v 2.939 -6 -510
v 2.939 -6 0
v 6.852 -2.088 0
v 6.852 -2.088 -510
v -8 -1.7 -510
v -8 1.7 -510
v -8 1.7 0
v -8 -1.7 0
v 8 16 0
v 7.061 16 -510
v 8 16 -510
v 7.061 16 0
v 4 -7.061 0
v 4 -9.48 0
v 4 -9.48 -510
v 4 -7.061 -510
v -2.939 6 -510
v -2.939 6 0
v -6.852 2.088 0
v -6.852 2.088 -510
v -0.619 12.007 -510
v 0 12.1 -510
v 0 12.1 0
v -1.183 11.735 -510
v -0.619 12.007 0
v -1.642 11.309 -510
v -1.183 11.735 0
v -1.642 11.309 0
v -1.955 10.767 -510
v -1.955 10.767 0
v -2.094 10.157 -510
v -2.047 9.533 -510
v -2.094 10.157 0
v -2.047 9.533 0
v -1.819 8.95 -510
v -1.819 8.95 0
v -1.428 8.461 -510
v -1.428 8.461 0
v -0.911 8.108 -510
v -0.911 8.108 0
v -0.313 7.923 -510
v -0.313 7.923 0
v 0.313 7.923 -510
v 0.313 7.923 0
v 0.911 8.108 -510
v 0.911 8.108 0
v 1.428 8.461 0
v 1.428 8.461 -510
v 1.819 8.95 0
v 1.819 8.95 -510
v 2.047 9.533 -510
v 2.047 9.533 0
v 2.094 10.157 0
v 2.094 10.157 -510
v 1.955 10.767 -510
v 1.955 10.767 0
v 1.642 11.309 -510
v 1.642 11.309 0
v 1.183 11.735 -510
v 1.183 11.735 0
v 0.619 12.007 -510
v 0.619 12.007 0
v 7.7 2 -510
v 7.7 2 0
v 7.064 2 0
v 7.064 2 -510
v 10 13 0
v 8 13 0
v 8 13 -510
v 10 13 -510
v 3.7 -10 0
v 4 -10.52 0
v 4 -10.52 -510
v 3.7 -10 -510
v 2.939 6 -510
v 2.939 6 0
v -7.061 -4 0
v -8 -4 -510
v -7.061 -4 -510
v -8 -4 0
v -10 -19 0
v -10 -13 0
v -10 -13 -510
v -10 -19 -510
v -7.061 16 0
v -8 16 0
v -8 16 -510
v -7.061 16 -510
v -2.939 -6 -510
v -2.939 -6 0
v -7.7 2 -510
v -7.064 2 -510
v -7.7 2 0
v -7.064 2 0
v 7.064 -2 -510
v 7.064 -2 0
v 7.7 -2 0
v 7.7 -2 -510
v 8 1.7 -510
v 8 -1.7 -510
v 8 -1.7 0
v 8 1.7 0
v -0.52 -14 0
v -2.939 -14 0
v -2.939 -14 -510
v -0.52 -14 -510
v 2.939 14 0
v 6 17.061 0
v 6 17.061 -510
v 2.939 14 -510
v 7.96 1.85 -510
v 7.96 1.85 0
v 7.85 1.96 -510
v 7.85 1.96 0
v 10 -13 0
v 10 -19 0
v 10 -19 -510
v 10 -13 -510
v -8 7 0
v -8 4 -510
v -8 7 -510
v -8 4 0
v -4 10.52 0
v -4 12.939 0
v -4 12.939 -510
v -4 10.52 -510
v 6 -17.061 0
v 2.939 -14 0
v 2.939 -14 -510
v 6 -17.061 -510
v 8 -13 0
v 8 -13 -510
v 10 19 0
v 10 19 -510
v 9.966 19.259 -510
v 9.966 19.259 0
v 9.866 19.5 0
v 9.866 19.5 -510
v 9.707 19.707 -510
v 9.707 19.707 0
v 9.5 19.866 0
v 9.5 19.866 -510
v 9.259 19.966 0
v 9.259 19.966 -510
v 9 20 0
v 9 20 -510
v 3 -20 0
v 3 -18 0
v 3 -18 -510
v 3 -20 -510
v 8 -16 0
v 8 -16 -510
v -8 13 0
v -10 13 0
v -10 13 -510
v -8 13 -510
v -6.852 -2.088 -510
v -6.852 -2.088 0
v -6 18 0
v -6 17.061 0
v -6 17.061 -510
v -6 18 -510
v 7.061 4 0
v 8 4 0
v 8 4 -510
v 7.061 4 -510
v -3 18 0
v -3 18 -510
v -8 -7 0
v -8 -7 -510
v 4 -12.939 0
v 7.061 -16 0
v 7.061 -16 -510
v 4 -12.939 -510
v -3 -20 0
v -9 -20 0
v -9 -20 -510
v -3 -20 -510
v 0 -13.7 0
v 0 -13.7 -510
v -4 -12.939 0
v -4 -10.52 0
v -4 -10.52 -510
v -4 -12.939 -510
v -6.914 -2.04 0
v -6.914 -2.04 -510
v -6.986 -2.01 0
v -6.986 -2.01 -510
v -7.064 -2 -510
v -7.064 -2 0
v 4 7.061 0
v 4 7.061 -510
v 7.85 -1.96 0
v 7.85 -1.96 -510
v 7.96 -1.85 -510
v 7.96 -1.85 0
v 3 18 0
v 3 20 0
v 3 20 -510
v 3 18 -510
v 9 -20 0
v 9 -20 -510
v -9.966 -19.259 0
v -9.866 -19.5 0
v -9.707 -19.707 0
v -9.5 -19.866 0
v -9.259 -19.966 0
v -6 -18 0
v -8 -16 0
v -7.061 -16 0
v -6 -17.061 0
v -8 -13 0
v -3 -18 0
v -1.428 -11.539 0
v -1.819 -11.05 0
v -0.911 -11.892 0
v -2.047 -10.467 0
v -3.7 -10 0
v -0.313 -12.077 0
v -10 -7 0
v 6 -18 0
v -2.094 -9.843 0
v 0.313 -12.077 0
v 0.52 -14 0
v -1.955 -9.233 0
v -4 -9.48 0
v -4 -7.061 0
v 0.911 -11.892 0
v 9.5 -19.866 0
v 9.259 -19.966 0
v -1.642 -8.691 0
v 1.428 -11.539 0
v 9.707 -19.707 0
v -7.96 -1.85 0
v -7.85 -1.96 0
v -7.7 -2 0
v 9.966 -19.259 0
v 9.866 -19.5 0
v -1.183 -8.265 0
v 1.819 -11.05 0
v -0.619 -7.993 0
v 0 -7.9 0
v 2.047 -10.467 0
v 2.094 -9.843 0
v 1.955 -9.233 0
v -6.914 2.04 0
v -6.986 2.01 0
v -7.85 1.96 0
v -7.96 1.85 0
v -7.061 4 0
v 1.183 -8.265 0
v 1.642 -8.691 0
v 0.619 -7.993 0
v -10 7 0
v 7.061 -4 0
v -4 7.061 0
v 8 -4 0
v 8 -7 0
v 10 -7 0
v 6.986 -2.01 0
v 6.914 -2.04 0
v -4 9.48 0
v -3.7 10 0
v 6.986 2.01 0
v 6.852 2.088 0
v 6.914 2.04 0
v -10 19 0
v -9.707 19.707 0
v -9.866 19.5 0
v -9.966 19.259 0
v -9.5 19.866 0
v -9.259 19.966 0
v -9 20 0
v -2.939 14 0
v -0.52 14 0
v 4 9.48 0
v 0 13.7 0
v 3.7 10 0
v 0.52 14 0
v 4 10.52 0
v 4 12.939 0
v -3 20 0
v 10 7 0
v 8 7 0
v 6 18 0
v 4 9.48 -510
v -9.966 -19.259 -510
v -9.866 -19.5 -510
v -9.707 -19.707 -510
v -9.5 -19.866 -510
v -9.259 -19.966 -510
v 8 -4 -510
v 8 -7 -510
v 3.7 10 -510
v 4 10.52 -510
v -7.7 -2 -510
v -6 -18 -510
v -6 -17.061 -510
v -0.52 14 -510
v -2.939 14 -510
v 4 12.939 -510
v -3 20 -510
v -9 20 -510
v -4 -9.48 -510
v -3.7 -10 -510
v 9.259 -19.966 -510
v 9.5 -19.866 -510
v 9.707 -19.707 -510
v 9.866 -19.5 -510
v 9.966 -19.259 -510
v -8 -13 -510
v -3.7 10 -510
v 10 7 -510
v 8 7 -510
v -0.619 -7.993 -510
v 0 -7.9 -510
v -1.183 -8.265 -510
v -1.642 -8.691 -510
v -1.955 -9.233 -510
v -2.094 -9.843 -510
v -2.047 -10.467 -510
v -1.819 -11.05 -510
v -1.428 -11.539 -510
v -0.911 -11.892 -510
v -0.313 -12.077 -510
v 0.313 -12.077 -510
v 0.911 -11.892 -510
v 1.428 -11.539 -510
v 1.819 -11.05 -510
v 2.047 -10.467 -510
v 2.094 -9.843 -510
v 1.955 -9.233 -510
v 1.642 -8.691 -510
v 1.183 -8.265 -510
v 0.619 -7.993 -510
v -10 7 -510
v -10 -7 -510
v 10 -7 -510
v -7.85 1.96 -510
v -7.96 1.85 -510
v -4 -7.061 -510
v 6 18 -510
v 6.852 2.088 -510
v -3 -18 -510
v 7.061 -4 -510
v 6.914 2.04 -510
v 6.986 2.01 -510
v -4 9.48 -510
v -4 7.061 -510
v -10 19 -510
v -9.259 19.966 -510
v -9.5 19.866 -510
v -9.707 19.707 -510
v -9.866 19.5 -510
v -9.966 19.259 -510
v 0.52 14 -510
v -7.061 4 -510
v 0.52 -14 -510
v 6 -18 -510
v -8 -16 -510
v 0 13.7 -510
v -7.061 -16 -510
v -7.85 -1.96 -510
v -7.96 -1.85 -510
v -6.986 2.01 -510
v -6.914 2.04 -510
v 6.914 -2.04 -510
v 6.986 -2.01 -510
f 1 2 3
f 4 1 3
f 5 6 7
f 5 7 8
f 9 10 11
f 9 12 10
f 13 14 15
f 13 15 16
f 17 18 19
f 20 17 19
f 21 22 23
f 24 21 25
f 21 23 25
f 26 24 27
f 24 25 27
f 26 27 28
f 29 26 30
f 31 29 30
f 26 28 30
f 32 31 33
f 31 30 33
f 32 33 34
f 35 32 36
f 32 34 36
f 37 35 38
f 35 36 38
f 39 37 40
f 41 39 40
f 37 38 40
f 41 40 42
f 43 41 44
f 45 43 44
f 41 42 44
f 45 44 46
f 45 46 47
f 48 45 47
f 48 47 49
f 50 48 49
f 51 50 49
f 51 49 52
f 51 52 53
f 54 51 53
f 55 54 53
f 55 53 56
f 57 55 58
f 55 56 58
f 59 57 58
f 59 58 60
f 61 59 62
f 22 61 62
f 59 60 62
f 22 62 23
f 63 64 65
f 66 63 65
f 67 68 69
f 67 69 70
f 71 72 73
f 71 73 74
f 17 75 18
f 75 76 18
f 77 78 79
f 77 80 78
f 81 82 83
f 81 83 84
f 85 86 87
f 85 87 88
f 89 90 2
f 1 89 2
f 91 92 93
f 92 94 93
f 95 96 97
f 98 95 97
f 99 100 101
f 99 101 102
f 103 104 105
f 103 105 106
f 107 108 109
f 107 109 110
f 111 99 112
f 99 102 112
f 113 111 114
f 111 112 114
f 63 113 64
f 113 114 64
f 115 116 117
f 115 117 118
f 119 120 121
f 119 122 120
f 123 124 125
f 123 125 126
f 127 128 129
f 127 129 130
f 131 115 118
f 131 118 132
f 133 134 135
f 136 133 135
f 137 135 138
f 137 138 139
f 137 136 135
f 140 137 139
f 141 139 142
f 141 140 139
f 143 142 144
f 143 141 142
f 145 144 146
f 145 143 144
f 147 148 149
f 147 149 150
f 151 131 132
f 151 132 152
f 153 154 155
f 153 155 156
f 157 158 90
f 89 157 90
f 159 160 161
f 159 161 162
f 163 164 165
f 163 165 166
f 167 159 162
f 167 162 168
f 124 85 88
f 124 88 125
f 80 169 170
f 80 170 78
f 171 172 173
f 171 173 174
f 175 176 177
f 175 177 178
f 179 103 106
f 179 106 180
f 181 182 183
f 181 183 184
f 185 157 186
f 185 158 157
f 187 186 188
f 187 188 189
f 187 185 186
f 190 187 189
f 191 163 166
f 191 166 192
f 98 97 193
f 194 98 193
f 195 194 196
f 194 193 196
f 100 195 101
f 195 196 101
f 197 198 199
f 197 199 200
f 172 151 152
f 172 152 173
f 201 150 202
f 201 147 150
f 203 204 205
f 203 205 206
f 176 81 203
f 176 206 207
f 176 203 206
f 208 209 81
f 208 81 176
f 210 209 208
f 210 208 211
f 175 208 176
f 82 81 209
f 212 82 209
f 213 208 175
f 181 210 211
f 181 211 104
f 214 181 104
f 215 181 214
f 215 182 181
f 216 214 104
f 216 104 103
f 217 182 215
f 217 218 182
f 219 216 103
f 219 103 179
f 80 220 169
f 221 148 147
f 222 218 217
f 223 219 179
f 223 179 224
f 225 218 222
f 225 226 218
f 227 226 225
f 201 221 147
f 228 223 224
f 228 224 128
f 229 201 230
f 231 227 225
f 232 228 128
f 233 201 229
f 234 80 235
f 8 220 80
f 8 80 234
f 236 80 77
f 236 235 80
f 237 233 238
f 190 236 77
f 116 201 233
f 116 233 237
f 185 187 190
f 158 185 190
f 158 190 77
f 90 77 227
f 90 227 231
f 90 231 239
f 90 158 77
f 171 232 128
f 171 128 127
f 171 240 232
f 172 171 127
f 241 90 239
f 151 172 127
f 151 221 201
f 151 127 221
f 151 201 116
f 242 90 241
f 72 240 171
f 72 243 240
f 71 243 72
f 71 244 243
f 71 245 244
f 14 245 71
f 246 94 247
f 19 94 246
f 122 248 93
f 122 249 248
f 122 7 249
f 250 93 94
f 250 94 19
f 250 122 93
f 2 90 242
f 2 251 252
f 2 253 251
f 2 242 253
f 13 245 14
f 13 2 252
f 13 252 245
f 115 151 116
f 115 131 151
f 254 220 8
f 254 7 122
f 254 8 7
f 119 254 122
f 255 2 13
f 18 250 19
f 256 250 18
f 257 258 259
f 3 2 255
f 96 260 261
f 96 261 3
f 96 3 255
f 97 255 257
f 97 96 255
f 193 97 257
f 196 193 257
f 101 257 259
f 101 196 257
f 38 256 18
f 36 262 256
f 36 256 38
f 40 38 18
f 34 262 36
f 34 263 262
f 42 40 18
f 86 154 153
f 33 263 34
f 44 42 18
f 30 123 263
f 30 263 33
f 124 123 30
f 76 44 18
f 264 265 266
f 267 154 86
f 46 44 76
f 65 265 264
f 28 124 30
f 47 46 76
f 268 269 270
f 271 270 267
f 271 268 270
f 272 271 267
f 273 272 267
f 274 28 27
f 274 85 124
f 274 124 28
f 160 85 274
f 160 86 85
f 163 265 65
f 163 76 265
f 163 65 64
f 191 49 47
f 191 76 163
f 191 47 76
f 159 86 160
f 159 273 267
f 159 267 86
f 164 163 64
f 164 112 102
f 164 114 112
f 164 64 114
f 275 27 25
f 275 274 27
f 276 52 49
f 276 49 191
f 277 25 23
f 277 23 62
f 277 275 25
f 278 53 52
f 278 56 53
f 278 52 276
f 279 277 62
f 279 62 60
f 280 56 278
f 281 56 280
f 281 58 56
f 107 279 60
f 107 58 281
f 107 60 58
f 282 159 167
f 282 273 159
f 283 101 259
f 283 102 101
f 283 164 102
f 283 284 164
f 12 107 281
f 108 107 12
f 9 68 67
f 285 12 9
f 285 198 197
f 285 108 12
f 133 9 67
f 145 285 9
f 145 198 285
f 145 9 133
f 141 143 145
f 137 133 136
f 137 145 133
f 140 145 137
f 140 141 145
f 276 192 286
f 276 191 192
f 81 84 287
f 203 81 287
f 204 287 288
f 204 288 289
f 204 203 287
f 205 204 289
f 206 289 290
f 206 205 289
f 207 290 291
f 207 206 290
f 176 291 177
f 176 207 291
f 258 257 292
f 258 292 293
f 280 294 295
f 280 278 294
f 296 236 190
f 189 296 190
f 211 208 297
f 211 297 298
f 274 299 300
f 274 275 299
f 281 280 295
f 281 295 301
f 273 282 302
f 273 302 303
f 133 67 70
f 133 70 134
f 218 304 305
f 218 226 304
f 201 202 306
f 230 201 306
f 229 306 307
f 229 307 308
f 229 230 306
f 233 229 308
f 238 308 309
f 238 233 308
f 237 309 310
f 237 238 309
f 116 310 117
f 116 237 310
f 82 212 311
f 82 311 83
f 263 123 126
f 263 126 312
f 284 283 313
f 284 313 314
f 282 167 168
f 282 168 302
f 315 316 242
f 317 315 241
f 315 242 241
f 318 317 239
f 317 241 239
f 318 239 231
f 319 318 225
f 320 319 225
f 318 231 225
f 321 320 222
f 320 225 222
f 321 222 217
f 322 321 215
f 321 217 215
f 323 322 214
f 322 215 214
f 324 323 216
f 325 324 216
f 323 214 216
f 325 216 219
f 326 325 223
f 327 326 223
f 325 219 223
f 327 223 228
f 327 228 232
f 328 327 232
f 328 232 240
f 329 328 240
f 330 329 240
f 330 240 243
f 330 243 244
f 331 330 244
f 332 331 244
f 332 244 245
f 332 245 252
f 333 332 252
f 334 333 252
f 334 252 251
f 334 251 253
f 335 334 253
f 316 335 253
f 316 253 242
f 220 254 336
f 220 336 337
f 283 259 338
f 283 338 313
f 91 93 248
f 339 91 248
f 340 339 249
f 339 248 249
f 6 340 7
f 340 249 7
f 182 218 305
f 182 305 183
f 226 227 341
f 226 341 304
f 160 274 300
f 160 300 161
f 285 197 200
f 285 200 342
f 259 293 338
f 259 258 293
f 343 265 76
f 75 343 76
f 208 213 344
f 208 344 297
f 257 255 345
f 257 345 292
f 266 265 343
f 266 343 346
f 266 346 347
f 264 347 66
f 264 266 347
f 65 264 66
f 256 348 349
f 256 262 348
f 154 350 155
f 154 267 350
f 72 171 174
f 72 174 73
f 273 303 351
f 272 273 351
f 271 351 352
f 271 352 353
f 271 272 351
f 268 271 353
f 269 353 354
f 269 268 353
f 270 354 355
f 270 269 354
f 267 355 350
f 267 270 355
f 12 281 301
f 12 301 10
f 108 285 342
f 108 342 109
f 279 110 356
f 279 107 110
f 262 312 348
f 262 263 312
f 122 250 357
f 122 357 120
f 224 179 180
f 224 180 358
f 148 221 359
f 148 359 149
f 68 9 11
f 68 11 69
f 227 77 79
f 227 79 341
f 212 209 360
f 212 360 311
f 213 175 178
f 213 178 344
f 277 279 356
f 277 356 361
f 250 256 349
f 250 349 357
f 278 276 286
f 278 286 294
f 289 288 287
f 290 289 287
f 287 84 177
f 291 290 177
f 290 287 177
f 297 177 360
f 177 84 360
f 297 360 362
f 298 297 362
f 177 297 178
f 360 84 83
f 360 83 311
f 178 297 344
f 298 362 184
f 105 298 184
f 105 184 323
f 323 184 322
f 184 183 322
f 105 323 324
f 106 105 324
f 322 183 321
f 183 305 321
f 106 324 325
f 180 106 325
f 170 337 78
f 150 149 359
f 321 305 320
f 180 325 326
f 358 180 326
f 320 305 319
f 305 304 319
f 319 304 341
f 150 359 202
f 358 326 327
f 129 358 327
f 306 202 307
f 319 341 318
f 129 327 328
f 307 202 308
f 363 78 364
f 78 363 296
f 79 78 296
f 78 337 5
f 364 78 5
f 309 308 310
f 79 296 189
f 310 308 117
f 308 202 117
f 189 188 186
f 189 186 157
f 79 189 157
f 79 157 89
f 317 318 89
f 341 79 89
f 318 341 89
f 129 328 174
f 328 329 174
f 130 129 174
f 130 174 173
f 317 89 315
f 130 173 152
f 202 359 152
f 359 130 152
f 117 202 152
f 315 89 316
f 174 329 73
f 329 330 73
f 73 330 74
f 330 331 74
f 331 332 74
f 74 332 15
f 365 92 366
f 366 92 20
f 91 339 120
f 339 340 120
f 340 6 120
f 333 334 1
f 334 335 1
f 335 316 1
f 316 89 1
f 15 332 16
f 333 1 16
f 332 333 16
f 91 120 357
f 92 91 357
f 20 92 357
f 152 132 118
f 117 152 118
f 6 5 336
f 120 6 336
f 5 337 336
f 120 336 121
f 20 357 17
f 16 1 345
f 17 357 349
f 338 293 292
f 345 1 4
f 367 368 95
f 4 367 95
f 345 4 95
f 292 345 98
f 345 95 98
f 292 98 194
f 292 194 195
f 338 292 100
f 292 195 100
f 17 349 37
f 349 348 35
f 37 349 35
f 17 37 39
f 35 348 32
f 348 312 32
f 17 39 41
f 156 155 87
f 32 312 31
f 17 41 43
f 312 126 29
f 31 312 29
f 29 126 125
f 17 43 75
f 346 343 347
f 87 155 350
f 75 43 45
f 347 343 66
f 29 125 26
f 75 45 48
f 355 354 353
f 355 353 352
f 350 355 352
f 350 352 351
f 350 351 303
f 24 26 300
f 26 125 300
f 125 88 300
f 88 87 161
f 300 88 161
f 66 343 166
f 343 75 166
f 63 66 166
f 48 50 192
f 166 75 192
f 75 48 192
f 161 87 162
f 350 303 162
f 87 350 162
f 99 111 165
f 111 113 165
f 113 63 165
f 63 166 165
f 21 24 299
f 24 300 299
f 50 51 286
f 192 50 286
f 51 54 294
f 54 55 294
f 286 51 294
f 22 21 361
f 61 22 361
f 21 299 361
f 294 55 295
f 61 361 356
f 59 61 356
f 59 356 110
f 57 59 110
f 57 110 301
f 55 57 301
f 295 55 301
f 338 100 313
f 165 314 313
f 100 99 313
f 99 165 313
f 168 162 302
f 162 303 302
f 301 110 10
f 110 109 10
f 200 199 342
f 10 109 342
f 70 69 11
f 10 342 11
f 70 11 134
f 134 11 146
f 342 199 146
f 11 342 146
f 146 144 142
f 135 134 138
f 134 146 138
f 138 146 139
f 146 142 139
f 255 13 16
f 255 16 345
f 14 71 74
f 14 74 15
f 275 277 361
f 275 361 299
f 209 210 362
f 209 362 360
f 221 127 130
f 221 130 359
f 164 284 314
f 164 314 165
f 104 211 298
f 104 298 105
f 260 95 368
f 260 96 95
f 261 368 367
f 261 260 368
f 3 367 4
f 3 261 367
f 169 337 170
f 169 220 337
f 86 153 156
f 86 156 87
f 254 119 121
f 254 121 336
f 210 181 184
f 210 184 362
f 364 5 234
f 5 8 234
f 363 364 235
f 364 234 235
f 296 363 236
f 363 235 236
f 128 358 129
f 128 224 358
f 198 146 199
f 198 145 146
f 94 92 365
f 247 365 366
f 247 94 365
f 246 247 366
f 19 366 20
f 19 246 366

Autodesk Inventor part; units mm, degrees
sketch "Sketch_1" plane through (0, 0, 0) normal (0, 0, 1) x (1, 0, 0)
  line L0 (-10, -7) -> (-8, -7)
  line L1 (-8, -7) -> (-8, -4)
  line L2 (-8, -4) -> (-7.0607, -4)
  line L3 (-7.0607, -4) -> (-4, -7.0607)
  line L4 (-4, -7.0607) -> (-4, -9.4804)
  line L5 (-4, -9.4804) -> (-3.7, -10)
  line L6 (-3.7, -10) -> (-4, -10.5196)
  line L7 (-4, -10.5196) -> (-4, -12.9393)
  line L8 (-4, -12.9393) -> (-7.0607, -16)
  line L9 (-7.0607, -16) -> (-8, -16)
  line L10 (-8, -16) -> (-8, -13)
  line L11 (-8, -13) -> (-10, -13)
  line L12 (-10, -13) -> (-10, -19)
  arc A0 (-10, -19) -> (-9, -20) centre (-9, -19) ccw
  line L13 (-9, -20) -> (-3, -20)
  line L14 (-3, -20) -> (-3, -18)
  line L15 (-3, -18) -> (-6, -18)
  line L16 (-6, -18) -> (-6, -17.0607)
  line L17 (-6, -17.0607) -> (-2.9393, -14)
  line L18 (-2.9393, -14) -> (-0.5196, -14)
  line L19 (-0.5196, -14) -> (0, -13.7)
  line L20 (0, -13.7) -> (0.5196, -14)
  line L21 (0.5196, -14) -> (2.9393, -14)
  line L22 (2.9393, -14) -> (6, -17.0607)
  line L23 (6, -17.0607) -> (6, -18)
  line L24 (6, -18) -> (3, -18)
  line L25 (3, -18) -> (3, -20)
  line L26 (3, -20) -> (9, -20)
  arc A1 (9, -20) -> (10, -19) centre (9, -19) ccw
  line L27 (10, -19) -> (10, -13)
  line L28 (10, -13) -> (8, -13)
  line L29 (8, -13) -> (8, -16)
  line L30 (8, -16) -> (7.0607, -16)
  line L31 (7.0607, -16) -> (4, -12.9393)
  line L32 (4, -12.9393) -> (4, -10.5196)
  line L33 (4, -10.5196) -> (3.7, -10)
  line L34 (3.7, -10) -> (4, -9.4804)
  line L35 (4, -9.4804) -> (4, -7.0607)
  line L36 (4, -7.0607) -> (7.0607, -4)
  line L37 (7.0607, -4) -> (8, -4)
  line L38 (8, -4) -> (8, -7)
  line L39 (8, -7) -> (10, -7)
  line L40 (10, -7) -> (10, 7)
  line L41 (10, 7) -> (8, 7)
  line L42 (8, 7) -> (8, 4)
  line L43 (8, 4) -> (7.0607, 4)
  line L44 (7.0607, 4) -> (4, 7.0607)
  line L45 (4, 7.0607) -> (4, 9.4804)
  line L46 (4, 9.4804) -> (3.7, 10)
  line L47 (3.7, 10) -> (4, 10.5196)
  line L48 (4, 10.5196) -> (4, 12.9393)
  line L49 (4, 12.9393) -> (7.0607, 16)
  line L50 (7.0607, 16) -> (8, 16)
  line L51 (8, 16) -> (8, 13)
  line L52 (8, 13) -> (10, 13)
  line L53 (10, 13) -> (10, 19)
  arc A2 (10, 19) -> (9, 20) centre (9, 19) ccw
  line L54 (9, 20) -> (3, 20)
  line L55 (3, 20) -> (3, 18)
  line L56 (3, 18) -> (6, 18)
  line L57 (6, 18) -> (6, 17.0607)
  line L58 (6, 17.0607) -> (2.9393, 14)
  line L59 (2.9393, 14) -> (0.5196, 14)
  line L60 (0.5196, 14) -> (0, 13.7)
  line L61 (0, 13.7) -> (-0.5196, 14)
  line L62 (-0.5196, 14) -> (-2.9393, 14)
  line L63 (-2.9393, 14) -> (-6, 17.0607)
  line L64 (-6, 17.0607) -> (-6, 18)
  line L65 (-6, 18) -> (-3, 18)
  line L66 (-3, 18) -> (-3, 20)
  line L67 (-3, 20) -> (-9, 20)
  arc A3 (-9, 20) -> (-10, 19) centre (-9, 19) ccw
  line L68 (-10, 19) -> (-10, 13)
  line L69 (-10, 13) -> (-8, 13)
  line L70 (-8, 13) -> (-8, 16)
  line L71 (-8, 16) -> (-7.0607, 16)
  line L72 (-7.0607, 16) -> (-4, 12.9393)
  line L73 (-4, 12.9393) -> (-4, 10.5196)
  line L74 (-4, 10.5196) -> (-3.7, 10)
  line L75 (-3.7, 10) -> (-4, 9.4804)
  line L76 (-4, 9.4804) -> (-4, 7.0607)
  line L77 (-4, 7.0607) -> (-7.0607, 4)
  line L78 (-7.0607, 4) -> (-8, 4)
  line L79 (-8, 4) -> (-8, 7)
  line L80 (-8, 7) -> (-10, 7)
  line L81 (-10, 7) -> (-10, -7)
  line L82 (-8, 1.7) -> (-8, -1.7)
  arc A4 (-8, -1.7) -> (-7.7, -2) centre (-7.7, -1.7) ccw
  line L83 (-7.7, -2) -> (-7.0636, -2)
  arc A5 (-6.8515, -2.0879) -> (-7.0636, -2) centre (-7.0636, -2.3) ccw
  line L84 (-6.8515, -2.0879) -> (-2.9393, -6)
  line L85 (-2.9393, -6) -> (2.9393, -6)
  line L86 (2.9393, -6) -> (6.8515, -2.0879)
  arc A6 (7.0636, -2) -> (6.8515, -2.0879) centre (7.0636, -2.3) ccw
  line L87 (7.0636, -2) -> (7.7, -2)
  arc A7 (7.7, -2) -> (8, -1.7) centre (7.7, -1.7) ccw
  line L88 (8, -1.7) -> (8, 1.7)
  arc A8 (8, 1.7) -> (7.7, 2) centre (7.7, 1.7) ccw
  line L89 (7.7, 2) -> (7.0636, 2)
  arc A9 (6.8515, 2.0879) -> (7.0636, 2) centre (7.0636, 2.3) ccw
  line L90 (6.8515, 2.0879) -> (2.9393, 6)
  line L91 (2.9393, 6) -> (-2.9393, 6)
  line L92 (-2.9393, 6) -> (-6.8515, 2.0879)
  arc A10 (-7.0636, 2) -> (-6.8515, 2.0879) centre (-7.0636, 2.3) ccw
  line L93 (-7.0636, 2) -> (-7.7, 2)
  arc A11 (-7.7, 2) -> (-8, 1.7) centre (-7.7, 1.7) ccw
extrude "Extrusion1" add sketch "Sketch_1" against normal blind 510
sketch "Sketch2" plane through (0, 0, -510) normal (0, 0, -1) x (-1, 0, 0)
  point P0 (0, 10)
hole "Hole1" at (0, 10, -510) direction (0, 0, 1) diameter 4.2 depth 510
pattern_linear "Rectangular Pattern1" count 2 spacing 20 along (0, -1, 0) of "Hole1"
ref_plane "C1_XY" through (0, 0, 0) normal (0, 0, 1) x (1, 0, 0)
ref_plane "C1_YZ" through (0, 0, 0) normal (1, 0, 0) x (0, 1, 0)
ref_plane "C1_ZX" through (0, 0, 0) normal (0, 1, 0) x (0, 0, 1)
properties part number "HFS5-2040-510"
